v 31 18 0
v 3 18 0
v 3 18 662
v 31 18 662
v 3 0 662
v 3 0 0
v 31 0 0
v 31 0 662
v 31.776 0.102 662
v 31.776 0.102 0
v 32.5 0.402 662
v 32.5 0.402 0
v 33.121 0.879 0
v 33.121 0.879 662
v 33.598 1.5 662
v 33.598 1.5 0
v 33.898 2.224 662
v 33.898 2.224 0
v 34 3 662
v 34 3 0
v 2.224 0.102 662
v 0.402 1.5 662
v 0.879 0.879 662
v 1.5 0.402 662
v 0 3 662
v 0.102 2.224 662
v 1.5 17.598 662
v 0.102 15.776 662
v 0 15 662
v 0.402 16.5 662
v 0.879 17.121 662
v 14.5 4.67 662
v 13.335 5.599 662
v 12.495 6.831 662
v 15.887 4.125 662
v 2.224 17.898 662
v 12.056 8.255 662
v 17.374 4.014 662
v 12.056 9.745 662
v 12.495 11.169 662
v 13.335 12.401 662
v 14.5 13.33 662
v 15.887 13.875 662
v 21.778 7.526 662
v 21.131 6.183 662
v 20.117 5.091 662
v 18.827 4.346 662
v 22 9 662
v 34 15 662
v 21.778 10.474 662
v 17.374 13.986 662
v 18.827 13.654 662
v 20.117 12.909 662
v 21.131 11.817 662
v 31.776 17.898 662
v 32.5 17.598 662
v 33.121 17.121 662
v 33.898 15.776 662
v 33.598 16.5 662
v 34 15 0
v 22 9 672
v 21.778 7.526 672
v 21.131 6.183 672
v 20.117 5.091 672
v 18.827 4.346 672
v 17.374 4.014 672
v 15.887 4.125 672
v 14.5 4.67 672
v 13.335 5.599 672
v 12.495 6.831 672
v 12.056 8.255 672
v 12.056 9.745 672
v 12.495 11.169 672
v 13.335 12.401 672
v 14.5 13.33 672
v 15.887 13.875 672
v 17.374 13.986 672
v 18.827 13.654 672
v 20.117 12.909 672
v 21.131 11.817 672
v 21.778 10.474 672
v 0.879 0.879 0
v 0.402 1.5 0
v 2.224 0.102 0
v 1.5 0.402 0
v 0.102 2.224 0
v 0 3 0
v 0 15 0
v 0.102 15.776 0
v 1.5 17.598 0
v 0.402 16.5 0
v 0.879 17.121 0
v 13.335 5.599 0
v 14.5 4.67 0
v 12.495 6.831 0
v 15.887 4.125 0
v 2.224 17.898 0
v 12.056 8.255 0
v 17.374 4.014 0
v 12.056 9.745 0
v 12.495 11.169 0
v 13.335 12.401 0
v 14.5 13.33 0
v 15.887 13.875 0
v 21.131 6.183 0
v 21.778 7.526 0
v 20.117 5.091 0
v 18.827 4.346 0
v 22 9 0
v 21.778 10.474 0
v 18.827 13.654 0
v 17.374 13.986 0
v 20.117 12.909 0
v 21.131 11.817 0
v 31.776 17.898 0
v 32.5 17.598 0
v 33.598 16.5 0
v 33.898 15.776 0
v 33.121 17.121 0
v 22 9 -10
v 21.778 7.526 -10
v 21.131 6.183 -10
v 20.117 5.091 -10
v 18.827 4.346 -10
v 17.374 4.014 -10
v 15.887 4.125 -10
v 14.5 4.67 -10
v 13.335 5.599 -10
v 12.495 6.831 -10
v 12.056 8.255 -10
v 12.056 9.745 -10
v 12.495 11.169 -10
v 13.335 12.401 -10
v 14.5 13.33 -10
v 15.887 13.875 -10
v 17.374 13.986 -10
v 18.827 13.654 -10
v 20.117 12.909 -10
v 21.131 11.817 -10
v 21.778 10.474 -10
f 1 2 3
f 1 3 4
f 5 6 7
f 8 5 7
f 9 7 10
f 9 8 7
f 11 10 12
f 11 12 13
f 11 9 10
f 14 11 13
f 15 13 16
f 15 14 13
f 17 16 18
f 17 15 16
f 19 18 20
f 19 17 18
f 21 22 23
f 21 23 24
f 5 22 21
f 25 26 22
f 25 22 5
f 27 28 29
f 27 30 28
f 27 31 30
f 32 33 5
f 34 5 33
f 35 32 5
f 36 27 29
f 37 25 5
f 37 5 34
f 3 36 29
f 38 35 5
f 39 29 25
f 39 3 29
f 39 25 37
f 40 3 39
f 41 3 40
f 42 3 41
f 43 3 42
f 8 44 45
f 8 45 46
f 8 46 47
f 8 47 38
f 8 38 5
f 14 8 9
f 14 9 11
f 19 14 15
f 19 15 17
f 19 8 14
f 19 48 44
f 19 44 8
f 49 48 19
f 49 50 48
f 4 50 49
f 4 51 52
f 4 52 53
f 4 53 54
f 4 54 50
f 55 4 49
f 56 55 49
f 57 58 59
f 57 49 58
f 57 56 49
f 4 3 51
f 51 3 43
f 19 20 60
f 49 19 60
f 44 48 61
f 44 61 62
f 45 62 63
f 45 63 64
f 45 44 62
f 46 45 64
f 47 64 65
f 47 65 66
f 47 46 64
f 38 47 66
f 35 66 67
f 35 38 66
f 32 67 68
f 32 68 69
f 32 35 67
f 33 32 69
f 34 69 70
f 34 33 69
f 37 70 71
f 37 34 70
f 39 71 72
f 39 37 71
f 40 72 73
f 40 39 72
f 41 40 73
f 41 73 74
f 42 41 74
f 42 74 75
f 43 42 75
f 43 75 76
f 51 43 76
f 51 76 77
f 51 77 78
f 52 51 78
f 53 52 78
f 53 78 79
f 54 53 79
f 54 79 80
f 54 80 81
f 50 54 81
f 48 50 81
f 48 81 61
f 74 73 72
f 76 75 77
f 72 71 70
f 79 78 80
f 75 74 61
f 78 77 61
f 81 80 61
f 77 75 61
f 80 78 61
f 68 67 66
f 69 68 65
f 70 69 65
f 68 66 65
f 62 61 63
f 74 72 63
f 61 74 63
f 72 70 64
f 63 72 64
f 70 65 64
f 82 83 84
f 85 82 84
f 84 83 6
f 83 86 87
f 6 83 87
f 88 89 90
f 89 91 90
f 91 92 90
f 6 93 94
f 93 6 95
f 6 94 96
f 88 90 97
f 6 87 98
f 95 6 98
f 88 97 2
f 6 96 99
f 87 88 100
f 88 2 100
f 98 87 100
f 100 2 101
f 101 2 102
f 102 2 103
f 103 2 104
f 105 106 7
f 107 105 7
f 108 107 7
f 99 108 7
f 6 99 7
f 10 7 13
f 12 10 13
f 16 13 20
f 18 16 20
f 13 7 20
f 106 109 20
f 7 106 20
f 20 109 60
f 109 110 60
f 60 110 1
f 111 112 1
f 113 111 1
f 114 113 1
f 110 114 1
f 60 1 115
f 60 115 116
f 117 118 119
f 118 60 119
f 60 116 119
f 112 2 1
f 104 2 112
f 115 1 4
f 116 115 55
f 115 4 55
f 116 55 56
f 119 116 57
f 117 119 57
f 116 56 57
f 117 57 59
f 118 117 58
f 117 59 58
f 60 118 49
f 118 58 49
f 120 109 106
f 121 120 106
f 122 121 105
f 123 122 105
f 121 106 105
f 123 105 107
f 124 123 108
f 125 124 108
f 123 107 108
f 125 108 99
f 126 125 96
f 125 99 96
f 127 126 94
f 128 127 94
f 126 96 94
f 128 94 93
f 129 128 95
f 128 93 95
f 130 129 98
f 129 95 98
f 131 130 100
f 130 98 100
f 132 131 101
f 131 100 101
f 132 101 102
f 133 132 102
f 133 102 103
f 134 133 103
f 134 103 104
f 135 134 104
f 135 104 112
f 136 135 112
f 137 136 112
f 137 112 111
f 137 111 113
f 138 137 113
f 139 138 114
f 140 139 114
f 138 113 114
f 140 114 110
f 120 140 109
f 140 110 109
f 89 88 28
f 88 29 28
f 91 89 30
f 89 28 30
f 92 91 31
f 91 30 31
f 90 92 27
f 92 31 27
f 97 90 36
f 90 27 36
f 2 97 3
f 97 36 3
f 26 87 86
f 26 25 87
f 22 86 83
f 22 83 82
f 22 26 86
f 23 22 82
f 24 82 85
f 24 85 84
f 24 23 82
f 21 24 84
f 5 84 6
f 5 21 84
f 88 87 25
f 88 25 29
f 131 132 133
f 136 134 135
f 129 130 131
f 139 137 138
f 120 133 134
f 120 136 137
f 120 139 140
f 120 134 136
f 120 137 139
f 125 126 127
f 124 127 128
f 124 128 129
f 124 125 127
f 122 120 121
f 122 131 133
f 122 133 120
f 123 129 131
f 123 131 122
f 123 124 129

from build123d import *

# Parameters (mm, degrees)
F0_W          = 34
F0_H          = 18
F1_DEPTH      = 662
F2_R          = 5
F3_DEPTH      = 10
F3_DEPTH_BACK = 672
F4_R          = 3


with BuildPart() as f1:
    # F0 (on Top) → F1 (new body)
    with BuildSketch(Plane.XY):
        with Locations((17, 9)):
            Rectangle(F0_W, F0_H)
    extrude(amount=F1_DEPTH)

    # F2 (on face) → F3 (join, two sides)
    with BuildSketch(Plane(origin=(0, 0, 0), x_dir=(1, 0, 0), z_dir=(0, 0, -1))) as f3_sk:
        with Locations((17, -9)):
            Circle(F2_R)
    extrude(amount=F3_DEPTH)
    extrude(f3_sk.sketch, amount=-F3_DEPTH_BACK)

    # F4
    f4_edges = [f1.edges().sort_by_distance(p)[0] for p in [
        (0, 0, 331),
        (0, 18, 331),
        (34, 18, 331),
        (34, 0, 331),
    ]]
    fillet(f4_edges, radius=F4_R)


solid = f1.part
